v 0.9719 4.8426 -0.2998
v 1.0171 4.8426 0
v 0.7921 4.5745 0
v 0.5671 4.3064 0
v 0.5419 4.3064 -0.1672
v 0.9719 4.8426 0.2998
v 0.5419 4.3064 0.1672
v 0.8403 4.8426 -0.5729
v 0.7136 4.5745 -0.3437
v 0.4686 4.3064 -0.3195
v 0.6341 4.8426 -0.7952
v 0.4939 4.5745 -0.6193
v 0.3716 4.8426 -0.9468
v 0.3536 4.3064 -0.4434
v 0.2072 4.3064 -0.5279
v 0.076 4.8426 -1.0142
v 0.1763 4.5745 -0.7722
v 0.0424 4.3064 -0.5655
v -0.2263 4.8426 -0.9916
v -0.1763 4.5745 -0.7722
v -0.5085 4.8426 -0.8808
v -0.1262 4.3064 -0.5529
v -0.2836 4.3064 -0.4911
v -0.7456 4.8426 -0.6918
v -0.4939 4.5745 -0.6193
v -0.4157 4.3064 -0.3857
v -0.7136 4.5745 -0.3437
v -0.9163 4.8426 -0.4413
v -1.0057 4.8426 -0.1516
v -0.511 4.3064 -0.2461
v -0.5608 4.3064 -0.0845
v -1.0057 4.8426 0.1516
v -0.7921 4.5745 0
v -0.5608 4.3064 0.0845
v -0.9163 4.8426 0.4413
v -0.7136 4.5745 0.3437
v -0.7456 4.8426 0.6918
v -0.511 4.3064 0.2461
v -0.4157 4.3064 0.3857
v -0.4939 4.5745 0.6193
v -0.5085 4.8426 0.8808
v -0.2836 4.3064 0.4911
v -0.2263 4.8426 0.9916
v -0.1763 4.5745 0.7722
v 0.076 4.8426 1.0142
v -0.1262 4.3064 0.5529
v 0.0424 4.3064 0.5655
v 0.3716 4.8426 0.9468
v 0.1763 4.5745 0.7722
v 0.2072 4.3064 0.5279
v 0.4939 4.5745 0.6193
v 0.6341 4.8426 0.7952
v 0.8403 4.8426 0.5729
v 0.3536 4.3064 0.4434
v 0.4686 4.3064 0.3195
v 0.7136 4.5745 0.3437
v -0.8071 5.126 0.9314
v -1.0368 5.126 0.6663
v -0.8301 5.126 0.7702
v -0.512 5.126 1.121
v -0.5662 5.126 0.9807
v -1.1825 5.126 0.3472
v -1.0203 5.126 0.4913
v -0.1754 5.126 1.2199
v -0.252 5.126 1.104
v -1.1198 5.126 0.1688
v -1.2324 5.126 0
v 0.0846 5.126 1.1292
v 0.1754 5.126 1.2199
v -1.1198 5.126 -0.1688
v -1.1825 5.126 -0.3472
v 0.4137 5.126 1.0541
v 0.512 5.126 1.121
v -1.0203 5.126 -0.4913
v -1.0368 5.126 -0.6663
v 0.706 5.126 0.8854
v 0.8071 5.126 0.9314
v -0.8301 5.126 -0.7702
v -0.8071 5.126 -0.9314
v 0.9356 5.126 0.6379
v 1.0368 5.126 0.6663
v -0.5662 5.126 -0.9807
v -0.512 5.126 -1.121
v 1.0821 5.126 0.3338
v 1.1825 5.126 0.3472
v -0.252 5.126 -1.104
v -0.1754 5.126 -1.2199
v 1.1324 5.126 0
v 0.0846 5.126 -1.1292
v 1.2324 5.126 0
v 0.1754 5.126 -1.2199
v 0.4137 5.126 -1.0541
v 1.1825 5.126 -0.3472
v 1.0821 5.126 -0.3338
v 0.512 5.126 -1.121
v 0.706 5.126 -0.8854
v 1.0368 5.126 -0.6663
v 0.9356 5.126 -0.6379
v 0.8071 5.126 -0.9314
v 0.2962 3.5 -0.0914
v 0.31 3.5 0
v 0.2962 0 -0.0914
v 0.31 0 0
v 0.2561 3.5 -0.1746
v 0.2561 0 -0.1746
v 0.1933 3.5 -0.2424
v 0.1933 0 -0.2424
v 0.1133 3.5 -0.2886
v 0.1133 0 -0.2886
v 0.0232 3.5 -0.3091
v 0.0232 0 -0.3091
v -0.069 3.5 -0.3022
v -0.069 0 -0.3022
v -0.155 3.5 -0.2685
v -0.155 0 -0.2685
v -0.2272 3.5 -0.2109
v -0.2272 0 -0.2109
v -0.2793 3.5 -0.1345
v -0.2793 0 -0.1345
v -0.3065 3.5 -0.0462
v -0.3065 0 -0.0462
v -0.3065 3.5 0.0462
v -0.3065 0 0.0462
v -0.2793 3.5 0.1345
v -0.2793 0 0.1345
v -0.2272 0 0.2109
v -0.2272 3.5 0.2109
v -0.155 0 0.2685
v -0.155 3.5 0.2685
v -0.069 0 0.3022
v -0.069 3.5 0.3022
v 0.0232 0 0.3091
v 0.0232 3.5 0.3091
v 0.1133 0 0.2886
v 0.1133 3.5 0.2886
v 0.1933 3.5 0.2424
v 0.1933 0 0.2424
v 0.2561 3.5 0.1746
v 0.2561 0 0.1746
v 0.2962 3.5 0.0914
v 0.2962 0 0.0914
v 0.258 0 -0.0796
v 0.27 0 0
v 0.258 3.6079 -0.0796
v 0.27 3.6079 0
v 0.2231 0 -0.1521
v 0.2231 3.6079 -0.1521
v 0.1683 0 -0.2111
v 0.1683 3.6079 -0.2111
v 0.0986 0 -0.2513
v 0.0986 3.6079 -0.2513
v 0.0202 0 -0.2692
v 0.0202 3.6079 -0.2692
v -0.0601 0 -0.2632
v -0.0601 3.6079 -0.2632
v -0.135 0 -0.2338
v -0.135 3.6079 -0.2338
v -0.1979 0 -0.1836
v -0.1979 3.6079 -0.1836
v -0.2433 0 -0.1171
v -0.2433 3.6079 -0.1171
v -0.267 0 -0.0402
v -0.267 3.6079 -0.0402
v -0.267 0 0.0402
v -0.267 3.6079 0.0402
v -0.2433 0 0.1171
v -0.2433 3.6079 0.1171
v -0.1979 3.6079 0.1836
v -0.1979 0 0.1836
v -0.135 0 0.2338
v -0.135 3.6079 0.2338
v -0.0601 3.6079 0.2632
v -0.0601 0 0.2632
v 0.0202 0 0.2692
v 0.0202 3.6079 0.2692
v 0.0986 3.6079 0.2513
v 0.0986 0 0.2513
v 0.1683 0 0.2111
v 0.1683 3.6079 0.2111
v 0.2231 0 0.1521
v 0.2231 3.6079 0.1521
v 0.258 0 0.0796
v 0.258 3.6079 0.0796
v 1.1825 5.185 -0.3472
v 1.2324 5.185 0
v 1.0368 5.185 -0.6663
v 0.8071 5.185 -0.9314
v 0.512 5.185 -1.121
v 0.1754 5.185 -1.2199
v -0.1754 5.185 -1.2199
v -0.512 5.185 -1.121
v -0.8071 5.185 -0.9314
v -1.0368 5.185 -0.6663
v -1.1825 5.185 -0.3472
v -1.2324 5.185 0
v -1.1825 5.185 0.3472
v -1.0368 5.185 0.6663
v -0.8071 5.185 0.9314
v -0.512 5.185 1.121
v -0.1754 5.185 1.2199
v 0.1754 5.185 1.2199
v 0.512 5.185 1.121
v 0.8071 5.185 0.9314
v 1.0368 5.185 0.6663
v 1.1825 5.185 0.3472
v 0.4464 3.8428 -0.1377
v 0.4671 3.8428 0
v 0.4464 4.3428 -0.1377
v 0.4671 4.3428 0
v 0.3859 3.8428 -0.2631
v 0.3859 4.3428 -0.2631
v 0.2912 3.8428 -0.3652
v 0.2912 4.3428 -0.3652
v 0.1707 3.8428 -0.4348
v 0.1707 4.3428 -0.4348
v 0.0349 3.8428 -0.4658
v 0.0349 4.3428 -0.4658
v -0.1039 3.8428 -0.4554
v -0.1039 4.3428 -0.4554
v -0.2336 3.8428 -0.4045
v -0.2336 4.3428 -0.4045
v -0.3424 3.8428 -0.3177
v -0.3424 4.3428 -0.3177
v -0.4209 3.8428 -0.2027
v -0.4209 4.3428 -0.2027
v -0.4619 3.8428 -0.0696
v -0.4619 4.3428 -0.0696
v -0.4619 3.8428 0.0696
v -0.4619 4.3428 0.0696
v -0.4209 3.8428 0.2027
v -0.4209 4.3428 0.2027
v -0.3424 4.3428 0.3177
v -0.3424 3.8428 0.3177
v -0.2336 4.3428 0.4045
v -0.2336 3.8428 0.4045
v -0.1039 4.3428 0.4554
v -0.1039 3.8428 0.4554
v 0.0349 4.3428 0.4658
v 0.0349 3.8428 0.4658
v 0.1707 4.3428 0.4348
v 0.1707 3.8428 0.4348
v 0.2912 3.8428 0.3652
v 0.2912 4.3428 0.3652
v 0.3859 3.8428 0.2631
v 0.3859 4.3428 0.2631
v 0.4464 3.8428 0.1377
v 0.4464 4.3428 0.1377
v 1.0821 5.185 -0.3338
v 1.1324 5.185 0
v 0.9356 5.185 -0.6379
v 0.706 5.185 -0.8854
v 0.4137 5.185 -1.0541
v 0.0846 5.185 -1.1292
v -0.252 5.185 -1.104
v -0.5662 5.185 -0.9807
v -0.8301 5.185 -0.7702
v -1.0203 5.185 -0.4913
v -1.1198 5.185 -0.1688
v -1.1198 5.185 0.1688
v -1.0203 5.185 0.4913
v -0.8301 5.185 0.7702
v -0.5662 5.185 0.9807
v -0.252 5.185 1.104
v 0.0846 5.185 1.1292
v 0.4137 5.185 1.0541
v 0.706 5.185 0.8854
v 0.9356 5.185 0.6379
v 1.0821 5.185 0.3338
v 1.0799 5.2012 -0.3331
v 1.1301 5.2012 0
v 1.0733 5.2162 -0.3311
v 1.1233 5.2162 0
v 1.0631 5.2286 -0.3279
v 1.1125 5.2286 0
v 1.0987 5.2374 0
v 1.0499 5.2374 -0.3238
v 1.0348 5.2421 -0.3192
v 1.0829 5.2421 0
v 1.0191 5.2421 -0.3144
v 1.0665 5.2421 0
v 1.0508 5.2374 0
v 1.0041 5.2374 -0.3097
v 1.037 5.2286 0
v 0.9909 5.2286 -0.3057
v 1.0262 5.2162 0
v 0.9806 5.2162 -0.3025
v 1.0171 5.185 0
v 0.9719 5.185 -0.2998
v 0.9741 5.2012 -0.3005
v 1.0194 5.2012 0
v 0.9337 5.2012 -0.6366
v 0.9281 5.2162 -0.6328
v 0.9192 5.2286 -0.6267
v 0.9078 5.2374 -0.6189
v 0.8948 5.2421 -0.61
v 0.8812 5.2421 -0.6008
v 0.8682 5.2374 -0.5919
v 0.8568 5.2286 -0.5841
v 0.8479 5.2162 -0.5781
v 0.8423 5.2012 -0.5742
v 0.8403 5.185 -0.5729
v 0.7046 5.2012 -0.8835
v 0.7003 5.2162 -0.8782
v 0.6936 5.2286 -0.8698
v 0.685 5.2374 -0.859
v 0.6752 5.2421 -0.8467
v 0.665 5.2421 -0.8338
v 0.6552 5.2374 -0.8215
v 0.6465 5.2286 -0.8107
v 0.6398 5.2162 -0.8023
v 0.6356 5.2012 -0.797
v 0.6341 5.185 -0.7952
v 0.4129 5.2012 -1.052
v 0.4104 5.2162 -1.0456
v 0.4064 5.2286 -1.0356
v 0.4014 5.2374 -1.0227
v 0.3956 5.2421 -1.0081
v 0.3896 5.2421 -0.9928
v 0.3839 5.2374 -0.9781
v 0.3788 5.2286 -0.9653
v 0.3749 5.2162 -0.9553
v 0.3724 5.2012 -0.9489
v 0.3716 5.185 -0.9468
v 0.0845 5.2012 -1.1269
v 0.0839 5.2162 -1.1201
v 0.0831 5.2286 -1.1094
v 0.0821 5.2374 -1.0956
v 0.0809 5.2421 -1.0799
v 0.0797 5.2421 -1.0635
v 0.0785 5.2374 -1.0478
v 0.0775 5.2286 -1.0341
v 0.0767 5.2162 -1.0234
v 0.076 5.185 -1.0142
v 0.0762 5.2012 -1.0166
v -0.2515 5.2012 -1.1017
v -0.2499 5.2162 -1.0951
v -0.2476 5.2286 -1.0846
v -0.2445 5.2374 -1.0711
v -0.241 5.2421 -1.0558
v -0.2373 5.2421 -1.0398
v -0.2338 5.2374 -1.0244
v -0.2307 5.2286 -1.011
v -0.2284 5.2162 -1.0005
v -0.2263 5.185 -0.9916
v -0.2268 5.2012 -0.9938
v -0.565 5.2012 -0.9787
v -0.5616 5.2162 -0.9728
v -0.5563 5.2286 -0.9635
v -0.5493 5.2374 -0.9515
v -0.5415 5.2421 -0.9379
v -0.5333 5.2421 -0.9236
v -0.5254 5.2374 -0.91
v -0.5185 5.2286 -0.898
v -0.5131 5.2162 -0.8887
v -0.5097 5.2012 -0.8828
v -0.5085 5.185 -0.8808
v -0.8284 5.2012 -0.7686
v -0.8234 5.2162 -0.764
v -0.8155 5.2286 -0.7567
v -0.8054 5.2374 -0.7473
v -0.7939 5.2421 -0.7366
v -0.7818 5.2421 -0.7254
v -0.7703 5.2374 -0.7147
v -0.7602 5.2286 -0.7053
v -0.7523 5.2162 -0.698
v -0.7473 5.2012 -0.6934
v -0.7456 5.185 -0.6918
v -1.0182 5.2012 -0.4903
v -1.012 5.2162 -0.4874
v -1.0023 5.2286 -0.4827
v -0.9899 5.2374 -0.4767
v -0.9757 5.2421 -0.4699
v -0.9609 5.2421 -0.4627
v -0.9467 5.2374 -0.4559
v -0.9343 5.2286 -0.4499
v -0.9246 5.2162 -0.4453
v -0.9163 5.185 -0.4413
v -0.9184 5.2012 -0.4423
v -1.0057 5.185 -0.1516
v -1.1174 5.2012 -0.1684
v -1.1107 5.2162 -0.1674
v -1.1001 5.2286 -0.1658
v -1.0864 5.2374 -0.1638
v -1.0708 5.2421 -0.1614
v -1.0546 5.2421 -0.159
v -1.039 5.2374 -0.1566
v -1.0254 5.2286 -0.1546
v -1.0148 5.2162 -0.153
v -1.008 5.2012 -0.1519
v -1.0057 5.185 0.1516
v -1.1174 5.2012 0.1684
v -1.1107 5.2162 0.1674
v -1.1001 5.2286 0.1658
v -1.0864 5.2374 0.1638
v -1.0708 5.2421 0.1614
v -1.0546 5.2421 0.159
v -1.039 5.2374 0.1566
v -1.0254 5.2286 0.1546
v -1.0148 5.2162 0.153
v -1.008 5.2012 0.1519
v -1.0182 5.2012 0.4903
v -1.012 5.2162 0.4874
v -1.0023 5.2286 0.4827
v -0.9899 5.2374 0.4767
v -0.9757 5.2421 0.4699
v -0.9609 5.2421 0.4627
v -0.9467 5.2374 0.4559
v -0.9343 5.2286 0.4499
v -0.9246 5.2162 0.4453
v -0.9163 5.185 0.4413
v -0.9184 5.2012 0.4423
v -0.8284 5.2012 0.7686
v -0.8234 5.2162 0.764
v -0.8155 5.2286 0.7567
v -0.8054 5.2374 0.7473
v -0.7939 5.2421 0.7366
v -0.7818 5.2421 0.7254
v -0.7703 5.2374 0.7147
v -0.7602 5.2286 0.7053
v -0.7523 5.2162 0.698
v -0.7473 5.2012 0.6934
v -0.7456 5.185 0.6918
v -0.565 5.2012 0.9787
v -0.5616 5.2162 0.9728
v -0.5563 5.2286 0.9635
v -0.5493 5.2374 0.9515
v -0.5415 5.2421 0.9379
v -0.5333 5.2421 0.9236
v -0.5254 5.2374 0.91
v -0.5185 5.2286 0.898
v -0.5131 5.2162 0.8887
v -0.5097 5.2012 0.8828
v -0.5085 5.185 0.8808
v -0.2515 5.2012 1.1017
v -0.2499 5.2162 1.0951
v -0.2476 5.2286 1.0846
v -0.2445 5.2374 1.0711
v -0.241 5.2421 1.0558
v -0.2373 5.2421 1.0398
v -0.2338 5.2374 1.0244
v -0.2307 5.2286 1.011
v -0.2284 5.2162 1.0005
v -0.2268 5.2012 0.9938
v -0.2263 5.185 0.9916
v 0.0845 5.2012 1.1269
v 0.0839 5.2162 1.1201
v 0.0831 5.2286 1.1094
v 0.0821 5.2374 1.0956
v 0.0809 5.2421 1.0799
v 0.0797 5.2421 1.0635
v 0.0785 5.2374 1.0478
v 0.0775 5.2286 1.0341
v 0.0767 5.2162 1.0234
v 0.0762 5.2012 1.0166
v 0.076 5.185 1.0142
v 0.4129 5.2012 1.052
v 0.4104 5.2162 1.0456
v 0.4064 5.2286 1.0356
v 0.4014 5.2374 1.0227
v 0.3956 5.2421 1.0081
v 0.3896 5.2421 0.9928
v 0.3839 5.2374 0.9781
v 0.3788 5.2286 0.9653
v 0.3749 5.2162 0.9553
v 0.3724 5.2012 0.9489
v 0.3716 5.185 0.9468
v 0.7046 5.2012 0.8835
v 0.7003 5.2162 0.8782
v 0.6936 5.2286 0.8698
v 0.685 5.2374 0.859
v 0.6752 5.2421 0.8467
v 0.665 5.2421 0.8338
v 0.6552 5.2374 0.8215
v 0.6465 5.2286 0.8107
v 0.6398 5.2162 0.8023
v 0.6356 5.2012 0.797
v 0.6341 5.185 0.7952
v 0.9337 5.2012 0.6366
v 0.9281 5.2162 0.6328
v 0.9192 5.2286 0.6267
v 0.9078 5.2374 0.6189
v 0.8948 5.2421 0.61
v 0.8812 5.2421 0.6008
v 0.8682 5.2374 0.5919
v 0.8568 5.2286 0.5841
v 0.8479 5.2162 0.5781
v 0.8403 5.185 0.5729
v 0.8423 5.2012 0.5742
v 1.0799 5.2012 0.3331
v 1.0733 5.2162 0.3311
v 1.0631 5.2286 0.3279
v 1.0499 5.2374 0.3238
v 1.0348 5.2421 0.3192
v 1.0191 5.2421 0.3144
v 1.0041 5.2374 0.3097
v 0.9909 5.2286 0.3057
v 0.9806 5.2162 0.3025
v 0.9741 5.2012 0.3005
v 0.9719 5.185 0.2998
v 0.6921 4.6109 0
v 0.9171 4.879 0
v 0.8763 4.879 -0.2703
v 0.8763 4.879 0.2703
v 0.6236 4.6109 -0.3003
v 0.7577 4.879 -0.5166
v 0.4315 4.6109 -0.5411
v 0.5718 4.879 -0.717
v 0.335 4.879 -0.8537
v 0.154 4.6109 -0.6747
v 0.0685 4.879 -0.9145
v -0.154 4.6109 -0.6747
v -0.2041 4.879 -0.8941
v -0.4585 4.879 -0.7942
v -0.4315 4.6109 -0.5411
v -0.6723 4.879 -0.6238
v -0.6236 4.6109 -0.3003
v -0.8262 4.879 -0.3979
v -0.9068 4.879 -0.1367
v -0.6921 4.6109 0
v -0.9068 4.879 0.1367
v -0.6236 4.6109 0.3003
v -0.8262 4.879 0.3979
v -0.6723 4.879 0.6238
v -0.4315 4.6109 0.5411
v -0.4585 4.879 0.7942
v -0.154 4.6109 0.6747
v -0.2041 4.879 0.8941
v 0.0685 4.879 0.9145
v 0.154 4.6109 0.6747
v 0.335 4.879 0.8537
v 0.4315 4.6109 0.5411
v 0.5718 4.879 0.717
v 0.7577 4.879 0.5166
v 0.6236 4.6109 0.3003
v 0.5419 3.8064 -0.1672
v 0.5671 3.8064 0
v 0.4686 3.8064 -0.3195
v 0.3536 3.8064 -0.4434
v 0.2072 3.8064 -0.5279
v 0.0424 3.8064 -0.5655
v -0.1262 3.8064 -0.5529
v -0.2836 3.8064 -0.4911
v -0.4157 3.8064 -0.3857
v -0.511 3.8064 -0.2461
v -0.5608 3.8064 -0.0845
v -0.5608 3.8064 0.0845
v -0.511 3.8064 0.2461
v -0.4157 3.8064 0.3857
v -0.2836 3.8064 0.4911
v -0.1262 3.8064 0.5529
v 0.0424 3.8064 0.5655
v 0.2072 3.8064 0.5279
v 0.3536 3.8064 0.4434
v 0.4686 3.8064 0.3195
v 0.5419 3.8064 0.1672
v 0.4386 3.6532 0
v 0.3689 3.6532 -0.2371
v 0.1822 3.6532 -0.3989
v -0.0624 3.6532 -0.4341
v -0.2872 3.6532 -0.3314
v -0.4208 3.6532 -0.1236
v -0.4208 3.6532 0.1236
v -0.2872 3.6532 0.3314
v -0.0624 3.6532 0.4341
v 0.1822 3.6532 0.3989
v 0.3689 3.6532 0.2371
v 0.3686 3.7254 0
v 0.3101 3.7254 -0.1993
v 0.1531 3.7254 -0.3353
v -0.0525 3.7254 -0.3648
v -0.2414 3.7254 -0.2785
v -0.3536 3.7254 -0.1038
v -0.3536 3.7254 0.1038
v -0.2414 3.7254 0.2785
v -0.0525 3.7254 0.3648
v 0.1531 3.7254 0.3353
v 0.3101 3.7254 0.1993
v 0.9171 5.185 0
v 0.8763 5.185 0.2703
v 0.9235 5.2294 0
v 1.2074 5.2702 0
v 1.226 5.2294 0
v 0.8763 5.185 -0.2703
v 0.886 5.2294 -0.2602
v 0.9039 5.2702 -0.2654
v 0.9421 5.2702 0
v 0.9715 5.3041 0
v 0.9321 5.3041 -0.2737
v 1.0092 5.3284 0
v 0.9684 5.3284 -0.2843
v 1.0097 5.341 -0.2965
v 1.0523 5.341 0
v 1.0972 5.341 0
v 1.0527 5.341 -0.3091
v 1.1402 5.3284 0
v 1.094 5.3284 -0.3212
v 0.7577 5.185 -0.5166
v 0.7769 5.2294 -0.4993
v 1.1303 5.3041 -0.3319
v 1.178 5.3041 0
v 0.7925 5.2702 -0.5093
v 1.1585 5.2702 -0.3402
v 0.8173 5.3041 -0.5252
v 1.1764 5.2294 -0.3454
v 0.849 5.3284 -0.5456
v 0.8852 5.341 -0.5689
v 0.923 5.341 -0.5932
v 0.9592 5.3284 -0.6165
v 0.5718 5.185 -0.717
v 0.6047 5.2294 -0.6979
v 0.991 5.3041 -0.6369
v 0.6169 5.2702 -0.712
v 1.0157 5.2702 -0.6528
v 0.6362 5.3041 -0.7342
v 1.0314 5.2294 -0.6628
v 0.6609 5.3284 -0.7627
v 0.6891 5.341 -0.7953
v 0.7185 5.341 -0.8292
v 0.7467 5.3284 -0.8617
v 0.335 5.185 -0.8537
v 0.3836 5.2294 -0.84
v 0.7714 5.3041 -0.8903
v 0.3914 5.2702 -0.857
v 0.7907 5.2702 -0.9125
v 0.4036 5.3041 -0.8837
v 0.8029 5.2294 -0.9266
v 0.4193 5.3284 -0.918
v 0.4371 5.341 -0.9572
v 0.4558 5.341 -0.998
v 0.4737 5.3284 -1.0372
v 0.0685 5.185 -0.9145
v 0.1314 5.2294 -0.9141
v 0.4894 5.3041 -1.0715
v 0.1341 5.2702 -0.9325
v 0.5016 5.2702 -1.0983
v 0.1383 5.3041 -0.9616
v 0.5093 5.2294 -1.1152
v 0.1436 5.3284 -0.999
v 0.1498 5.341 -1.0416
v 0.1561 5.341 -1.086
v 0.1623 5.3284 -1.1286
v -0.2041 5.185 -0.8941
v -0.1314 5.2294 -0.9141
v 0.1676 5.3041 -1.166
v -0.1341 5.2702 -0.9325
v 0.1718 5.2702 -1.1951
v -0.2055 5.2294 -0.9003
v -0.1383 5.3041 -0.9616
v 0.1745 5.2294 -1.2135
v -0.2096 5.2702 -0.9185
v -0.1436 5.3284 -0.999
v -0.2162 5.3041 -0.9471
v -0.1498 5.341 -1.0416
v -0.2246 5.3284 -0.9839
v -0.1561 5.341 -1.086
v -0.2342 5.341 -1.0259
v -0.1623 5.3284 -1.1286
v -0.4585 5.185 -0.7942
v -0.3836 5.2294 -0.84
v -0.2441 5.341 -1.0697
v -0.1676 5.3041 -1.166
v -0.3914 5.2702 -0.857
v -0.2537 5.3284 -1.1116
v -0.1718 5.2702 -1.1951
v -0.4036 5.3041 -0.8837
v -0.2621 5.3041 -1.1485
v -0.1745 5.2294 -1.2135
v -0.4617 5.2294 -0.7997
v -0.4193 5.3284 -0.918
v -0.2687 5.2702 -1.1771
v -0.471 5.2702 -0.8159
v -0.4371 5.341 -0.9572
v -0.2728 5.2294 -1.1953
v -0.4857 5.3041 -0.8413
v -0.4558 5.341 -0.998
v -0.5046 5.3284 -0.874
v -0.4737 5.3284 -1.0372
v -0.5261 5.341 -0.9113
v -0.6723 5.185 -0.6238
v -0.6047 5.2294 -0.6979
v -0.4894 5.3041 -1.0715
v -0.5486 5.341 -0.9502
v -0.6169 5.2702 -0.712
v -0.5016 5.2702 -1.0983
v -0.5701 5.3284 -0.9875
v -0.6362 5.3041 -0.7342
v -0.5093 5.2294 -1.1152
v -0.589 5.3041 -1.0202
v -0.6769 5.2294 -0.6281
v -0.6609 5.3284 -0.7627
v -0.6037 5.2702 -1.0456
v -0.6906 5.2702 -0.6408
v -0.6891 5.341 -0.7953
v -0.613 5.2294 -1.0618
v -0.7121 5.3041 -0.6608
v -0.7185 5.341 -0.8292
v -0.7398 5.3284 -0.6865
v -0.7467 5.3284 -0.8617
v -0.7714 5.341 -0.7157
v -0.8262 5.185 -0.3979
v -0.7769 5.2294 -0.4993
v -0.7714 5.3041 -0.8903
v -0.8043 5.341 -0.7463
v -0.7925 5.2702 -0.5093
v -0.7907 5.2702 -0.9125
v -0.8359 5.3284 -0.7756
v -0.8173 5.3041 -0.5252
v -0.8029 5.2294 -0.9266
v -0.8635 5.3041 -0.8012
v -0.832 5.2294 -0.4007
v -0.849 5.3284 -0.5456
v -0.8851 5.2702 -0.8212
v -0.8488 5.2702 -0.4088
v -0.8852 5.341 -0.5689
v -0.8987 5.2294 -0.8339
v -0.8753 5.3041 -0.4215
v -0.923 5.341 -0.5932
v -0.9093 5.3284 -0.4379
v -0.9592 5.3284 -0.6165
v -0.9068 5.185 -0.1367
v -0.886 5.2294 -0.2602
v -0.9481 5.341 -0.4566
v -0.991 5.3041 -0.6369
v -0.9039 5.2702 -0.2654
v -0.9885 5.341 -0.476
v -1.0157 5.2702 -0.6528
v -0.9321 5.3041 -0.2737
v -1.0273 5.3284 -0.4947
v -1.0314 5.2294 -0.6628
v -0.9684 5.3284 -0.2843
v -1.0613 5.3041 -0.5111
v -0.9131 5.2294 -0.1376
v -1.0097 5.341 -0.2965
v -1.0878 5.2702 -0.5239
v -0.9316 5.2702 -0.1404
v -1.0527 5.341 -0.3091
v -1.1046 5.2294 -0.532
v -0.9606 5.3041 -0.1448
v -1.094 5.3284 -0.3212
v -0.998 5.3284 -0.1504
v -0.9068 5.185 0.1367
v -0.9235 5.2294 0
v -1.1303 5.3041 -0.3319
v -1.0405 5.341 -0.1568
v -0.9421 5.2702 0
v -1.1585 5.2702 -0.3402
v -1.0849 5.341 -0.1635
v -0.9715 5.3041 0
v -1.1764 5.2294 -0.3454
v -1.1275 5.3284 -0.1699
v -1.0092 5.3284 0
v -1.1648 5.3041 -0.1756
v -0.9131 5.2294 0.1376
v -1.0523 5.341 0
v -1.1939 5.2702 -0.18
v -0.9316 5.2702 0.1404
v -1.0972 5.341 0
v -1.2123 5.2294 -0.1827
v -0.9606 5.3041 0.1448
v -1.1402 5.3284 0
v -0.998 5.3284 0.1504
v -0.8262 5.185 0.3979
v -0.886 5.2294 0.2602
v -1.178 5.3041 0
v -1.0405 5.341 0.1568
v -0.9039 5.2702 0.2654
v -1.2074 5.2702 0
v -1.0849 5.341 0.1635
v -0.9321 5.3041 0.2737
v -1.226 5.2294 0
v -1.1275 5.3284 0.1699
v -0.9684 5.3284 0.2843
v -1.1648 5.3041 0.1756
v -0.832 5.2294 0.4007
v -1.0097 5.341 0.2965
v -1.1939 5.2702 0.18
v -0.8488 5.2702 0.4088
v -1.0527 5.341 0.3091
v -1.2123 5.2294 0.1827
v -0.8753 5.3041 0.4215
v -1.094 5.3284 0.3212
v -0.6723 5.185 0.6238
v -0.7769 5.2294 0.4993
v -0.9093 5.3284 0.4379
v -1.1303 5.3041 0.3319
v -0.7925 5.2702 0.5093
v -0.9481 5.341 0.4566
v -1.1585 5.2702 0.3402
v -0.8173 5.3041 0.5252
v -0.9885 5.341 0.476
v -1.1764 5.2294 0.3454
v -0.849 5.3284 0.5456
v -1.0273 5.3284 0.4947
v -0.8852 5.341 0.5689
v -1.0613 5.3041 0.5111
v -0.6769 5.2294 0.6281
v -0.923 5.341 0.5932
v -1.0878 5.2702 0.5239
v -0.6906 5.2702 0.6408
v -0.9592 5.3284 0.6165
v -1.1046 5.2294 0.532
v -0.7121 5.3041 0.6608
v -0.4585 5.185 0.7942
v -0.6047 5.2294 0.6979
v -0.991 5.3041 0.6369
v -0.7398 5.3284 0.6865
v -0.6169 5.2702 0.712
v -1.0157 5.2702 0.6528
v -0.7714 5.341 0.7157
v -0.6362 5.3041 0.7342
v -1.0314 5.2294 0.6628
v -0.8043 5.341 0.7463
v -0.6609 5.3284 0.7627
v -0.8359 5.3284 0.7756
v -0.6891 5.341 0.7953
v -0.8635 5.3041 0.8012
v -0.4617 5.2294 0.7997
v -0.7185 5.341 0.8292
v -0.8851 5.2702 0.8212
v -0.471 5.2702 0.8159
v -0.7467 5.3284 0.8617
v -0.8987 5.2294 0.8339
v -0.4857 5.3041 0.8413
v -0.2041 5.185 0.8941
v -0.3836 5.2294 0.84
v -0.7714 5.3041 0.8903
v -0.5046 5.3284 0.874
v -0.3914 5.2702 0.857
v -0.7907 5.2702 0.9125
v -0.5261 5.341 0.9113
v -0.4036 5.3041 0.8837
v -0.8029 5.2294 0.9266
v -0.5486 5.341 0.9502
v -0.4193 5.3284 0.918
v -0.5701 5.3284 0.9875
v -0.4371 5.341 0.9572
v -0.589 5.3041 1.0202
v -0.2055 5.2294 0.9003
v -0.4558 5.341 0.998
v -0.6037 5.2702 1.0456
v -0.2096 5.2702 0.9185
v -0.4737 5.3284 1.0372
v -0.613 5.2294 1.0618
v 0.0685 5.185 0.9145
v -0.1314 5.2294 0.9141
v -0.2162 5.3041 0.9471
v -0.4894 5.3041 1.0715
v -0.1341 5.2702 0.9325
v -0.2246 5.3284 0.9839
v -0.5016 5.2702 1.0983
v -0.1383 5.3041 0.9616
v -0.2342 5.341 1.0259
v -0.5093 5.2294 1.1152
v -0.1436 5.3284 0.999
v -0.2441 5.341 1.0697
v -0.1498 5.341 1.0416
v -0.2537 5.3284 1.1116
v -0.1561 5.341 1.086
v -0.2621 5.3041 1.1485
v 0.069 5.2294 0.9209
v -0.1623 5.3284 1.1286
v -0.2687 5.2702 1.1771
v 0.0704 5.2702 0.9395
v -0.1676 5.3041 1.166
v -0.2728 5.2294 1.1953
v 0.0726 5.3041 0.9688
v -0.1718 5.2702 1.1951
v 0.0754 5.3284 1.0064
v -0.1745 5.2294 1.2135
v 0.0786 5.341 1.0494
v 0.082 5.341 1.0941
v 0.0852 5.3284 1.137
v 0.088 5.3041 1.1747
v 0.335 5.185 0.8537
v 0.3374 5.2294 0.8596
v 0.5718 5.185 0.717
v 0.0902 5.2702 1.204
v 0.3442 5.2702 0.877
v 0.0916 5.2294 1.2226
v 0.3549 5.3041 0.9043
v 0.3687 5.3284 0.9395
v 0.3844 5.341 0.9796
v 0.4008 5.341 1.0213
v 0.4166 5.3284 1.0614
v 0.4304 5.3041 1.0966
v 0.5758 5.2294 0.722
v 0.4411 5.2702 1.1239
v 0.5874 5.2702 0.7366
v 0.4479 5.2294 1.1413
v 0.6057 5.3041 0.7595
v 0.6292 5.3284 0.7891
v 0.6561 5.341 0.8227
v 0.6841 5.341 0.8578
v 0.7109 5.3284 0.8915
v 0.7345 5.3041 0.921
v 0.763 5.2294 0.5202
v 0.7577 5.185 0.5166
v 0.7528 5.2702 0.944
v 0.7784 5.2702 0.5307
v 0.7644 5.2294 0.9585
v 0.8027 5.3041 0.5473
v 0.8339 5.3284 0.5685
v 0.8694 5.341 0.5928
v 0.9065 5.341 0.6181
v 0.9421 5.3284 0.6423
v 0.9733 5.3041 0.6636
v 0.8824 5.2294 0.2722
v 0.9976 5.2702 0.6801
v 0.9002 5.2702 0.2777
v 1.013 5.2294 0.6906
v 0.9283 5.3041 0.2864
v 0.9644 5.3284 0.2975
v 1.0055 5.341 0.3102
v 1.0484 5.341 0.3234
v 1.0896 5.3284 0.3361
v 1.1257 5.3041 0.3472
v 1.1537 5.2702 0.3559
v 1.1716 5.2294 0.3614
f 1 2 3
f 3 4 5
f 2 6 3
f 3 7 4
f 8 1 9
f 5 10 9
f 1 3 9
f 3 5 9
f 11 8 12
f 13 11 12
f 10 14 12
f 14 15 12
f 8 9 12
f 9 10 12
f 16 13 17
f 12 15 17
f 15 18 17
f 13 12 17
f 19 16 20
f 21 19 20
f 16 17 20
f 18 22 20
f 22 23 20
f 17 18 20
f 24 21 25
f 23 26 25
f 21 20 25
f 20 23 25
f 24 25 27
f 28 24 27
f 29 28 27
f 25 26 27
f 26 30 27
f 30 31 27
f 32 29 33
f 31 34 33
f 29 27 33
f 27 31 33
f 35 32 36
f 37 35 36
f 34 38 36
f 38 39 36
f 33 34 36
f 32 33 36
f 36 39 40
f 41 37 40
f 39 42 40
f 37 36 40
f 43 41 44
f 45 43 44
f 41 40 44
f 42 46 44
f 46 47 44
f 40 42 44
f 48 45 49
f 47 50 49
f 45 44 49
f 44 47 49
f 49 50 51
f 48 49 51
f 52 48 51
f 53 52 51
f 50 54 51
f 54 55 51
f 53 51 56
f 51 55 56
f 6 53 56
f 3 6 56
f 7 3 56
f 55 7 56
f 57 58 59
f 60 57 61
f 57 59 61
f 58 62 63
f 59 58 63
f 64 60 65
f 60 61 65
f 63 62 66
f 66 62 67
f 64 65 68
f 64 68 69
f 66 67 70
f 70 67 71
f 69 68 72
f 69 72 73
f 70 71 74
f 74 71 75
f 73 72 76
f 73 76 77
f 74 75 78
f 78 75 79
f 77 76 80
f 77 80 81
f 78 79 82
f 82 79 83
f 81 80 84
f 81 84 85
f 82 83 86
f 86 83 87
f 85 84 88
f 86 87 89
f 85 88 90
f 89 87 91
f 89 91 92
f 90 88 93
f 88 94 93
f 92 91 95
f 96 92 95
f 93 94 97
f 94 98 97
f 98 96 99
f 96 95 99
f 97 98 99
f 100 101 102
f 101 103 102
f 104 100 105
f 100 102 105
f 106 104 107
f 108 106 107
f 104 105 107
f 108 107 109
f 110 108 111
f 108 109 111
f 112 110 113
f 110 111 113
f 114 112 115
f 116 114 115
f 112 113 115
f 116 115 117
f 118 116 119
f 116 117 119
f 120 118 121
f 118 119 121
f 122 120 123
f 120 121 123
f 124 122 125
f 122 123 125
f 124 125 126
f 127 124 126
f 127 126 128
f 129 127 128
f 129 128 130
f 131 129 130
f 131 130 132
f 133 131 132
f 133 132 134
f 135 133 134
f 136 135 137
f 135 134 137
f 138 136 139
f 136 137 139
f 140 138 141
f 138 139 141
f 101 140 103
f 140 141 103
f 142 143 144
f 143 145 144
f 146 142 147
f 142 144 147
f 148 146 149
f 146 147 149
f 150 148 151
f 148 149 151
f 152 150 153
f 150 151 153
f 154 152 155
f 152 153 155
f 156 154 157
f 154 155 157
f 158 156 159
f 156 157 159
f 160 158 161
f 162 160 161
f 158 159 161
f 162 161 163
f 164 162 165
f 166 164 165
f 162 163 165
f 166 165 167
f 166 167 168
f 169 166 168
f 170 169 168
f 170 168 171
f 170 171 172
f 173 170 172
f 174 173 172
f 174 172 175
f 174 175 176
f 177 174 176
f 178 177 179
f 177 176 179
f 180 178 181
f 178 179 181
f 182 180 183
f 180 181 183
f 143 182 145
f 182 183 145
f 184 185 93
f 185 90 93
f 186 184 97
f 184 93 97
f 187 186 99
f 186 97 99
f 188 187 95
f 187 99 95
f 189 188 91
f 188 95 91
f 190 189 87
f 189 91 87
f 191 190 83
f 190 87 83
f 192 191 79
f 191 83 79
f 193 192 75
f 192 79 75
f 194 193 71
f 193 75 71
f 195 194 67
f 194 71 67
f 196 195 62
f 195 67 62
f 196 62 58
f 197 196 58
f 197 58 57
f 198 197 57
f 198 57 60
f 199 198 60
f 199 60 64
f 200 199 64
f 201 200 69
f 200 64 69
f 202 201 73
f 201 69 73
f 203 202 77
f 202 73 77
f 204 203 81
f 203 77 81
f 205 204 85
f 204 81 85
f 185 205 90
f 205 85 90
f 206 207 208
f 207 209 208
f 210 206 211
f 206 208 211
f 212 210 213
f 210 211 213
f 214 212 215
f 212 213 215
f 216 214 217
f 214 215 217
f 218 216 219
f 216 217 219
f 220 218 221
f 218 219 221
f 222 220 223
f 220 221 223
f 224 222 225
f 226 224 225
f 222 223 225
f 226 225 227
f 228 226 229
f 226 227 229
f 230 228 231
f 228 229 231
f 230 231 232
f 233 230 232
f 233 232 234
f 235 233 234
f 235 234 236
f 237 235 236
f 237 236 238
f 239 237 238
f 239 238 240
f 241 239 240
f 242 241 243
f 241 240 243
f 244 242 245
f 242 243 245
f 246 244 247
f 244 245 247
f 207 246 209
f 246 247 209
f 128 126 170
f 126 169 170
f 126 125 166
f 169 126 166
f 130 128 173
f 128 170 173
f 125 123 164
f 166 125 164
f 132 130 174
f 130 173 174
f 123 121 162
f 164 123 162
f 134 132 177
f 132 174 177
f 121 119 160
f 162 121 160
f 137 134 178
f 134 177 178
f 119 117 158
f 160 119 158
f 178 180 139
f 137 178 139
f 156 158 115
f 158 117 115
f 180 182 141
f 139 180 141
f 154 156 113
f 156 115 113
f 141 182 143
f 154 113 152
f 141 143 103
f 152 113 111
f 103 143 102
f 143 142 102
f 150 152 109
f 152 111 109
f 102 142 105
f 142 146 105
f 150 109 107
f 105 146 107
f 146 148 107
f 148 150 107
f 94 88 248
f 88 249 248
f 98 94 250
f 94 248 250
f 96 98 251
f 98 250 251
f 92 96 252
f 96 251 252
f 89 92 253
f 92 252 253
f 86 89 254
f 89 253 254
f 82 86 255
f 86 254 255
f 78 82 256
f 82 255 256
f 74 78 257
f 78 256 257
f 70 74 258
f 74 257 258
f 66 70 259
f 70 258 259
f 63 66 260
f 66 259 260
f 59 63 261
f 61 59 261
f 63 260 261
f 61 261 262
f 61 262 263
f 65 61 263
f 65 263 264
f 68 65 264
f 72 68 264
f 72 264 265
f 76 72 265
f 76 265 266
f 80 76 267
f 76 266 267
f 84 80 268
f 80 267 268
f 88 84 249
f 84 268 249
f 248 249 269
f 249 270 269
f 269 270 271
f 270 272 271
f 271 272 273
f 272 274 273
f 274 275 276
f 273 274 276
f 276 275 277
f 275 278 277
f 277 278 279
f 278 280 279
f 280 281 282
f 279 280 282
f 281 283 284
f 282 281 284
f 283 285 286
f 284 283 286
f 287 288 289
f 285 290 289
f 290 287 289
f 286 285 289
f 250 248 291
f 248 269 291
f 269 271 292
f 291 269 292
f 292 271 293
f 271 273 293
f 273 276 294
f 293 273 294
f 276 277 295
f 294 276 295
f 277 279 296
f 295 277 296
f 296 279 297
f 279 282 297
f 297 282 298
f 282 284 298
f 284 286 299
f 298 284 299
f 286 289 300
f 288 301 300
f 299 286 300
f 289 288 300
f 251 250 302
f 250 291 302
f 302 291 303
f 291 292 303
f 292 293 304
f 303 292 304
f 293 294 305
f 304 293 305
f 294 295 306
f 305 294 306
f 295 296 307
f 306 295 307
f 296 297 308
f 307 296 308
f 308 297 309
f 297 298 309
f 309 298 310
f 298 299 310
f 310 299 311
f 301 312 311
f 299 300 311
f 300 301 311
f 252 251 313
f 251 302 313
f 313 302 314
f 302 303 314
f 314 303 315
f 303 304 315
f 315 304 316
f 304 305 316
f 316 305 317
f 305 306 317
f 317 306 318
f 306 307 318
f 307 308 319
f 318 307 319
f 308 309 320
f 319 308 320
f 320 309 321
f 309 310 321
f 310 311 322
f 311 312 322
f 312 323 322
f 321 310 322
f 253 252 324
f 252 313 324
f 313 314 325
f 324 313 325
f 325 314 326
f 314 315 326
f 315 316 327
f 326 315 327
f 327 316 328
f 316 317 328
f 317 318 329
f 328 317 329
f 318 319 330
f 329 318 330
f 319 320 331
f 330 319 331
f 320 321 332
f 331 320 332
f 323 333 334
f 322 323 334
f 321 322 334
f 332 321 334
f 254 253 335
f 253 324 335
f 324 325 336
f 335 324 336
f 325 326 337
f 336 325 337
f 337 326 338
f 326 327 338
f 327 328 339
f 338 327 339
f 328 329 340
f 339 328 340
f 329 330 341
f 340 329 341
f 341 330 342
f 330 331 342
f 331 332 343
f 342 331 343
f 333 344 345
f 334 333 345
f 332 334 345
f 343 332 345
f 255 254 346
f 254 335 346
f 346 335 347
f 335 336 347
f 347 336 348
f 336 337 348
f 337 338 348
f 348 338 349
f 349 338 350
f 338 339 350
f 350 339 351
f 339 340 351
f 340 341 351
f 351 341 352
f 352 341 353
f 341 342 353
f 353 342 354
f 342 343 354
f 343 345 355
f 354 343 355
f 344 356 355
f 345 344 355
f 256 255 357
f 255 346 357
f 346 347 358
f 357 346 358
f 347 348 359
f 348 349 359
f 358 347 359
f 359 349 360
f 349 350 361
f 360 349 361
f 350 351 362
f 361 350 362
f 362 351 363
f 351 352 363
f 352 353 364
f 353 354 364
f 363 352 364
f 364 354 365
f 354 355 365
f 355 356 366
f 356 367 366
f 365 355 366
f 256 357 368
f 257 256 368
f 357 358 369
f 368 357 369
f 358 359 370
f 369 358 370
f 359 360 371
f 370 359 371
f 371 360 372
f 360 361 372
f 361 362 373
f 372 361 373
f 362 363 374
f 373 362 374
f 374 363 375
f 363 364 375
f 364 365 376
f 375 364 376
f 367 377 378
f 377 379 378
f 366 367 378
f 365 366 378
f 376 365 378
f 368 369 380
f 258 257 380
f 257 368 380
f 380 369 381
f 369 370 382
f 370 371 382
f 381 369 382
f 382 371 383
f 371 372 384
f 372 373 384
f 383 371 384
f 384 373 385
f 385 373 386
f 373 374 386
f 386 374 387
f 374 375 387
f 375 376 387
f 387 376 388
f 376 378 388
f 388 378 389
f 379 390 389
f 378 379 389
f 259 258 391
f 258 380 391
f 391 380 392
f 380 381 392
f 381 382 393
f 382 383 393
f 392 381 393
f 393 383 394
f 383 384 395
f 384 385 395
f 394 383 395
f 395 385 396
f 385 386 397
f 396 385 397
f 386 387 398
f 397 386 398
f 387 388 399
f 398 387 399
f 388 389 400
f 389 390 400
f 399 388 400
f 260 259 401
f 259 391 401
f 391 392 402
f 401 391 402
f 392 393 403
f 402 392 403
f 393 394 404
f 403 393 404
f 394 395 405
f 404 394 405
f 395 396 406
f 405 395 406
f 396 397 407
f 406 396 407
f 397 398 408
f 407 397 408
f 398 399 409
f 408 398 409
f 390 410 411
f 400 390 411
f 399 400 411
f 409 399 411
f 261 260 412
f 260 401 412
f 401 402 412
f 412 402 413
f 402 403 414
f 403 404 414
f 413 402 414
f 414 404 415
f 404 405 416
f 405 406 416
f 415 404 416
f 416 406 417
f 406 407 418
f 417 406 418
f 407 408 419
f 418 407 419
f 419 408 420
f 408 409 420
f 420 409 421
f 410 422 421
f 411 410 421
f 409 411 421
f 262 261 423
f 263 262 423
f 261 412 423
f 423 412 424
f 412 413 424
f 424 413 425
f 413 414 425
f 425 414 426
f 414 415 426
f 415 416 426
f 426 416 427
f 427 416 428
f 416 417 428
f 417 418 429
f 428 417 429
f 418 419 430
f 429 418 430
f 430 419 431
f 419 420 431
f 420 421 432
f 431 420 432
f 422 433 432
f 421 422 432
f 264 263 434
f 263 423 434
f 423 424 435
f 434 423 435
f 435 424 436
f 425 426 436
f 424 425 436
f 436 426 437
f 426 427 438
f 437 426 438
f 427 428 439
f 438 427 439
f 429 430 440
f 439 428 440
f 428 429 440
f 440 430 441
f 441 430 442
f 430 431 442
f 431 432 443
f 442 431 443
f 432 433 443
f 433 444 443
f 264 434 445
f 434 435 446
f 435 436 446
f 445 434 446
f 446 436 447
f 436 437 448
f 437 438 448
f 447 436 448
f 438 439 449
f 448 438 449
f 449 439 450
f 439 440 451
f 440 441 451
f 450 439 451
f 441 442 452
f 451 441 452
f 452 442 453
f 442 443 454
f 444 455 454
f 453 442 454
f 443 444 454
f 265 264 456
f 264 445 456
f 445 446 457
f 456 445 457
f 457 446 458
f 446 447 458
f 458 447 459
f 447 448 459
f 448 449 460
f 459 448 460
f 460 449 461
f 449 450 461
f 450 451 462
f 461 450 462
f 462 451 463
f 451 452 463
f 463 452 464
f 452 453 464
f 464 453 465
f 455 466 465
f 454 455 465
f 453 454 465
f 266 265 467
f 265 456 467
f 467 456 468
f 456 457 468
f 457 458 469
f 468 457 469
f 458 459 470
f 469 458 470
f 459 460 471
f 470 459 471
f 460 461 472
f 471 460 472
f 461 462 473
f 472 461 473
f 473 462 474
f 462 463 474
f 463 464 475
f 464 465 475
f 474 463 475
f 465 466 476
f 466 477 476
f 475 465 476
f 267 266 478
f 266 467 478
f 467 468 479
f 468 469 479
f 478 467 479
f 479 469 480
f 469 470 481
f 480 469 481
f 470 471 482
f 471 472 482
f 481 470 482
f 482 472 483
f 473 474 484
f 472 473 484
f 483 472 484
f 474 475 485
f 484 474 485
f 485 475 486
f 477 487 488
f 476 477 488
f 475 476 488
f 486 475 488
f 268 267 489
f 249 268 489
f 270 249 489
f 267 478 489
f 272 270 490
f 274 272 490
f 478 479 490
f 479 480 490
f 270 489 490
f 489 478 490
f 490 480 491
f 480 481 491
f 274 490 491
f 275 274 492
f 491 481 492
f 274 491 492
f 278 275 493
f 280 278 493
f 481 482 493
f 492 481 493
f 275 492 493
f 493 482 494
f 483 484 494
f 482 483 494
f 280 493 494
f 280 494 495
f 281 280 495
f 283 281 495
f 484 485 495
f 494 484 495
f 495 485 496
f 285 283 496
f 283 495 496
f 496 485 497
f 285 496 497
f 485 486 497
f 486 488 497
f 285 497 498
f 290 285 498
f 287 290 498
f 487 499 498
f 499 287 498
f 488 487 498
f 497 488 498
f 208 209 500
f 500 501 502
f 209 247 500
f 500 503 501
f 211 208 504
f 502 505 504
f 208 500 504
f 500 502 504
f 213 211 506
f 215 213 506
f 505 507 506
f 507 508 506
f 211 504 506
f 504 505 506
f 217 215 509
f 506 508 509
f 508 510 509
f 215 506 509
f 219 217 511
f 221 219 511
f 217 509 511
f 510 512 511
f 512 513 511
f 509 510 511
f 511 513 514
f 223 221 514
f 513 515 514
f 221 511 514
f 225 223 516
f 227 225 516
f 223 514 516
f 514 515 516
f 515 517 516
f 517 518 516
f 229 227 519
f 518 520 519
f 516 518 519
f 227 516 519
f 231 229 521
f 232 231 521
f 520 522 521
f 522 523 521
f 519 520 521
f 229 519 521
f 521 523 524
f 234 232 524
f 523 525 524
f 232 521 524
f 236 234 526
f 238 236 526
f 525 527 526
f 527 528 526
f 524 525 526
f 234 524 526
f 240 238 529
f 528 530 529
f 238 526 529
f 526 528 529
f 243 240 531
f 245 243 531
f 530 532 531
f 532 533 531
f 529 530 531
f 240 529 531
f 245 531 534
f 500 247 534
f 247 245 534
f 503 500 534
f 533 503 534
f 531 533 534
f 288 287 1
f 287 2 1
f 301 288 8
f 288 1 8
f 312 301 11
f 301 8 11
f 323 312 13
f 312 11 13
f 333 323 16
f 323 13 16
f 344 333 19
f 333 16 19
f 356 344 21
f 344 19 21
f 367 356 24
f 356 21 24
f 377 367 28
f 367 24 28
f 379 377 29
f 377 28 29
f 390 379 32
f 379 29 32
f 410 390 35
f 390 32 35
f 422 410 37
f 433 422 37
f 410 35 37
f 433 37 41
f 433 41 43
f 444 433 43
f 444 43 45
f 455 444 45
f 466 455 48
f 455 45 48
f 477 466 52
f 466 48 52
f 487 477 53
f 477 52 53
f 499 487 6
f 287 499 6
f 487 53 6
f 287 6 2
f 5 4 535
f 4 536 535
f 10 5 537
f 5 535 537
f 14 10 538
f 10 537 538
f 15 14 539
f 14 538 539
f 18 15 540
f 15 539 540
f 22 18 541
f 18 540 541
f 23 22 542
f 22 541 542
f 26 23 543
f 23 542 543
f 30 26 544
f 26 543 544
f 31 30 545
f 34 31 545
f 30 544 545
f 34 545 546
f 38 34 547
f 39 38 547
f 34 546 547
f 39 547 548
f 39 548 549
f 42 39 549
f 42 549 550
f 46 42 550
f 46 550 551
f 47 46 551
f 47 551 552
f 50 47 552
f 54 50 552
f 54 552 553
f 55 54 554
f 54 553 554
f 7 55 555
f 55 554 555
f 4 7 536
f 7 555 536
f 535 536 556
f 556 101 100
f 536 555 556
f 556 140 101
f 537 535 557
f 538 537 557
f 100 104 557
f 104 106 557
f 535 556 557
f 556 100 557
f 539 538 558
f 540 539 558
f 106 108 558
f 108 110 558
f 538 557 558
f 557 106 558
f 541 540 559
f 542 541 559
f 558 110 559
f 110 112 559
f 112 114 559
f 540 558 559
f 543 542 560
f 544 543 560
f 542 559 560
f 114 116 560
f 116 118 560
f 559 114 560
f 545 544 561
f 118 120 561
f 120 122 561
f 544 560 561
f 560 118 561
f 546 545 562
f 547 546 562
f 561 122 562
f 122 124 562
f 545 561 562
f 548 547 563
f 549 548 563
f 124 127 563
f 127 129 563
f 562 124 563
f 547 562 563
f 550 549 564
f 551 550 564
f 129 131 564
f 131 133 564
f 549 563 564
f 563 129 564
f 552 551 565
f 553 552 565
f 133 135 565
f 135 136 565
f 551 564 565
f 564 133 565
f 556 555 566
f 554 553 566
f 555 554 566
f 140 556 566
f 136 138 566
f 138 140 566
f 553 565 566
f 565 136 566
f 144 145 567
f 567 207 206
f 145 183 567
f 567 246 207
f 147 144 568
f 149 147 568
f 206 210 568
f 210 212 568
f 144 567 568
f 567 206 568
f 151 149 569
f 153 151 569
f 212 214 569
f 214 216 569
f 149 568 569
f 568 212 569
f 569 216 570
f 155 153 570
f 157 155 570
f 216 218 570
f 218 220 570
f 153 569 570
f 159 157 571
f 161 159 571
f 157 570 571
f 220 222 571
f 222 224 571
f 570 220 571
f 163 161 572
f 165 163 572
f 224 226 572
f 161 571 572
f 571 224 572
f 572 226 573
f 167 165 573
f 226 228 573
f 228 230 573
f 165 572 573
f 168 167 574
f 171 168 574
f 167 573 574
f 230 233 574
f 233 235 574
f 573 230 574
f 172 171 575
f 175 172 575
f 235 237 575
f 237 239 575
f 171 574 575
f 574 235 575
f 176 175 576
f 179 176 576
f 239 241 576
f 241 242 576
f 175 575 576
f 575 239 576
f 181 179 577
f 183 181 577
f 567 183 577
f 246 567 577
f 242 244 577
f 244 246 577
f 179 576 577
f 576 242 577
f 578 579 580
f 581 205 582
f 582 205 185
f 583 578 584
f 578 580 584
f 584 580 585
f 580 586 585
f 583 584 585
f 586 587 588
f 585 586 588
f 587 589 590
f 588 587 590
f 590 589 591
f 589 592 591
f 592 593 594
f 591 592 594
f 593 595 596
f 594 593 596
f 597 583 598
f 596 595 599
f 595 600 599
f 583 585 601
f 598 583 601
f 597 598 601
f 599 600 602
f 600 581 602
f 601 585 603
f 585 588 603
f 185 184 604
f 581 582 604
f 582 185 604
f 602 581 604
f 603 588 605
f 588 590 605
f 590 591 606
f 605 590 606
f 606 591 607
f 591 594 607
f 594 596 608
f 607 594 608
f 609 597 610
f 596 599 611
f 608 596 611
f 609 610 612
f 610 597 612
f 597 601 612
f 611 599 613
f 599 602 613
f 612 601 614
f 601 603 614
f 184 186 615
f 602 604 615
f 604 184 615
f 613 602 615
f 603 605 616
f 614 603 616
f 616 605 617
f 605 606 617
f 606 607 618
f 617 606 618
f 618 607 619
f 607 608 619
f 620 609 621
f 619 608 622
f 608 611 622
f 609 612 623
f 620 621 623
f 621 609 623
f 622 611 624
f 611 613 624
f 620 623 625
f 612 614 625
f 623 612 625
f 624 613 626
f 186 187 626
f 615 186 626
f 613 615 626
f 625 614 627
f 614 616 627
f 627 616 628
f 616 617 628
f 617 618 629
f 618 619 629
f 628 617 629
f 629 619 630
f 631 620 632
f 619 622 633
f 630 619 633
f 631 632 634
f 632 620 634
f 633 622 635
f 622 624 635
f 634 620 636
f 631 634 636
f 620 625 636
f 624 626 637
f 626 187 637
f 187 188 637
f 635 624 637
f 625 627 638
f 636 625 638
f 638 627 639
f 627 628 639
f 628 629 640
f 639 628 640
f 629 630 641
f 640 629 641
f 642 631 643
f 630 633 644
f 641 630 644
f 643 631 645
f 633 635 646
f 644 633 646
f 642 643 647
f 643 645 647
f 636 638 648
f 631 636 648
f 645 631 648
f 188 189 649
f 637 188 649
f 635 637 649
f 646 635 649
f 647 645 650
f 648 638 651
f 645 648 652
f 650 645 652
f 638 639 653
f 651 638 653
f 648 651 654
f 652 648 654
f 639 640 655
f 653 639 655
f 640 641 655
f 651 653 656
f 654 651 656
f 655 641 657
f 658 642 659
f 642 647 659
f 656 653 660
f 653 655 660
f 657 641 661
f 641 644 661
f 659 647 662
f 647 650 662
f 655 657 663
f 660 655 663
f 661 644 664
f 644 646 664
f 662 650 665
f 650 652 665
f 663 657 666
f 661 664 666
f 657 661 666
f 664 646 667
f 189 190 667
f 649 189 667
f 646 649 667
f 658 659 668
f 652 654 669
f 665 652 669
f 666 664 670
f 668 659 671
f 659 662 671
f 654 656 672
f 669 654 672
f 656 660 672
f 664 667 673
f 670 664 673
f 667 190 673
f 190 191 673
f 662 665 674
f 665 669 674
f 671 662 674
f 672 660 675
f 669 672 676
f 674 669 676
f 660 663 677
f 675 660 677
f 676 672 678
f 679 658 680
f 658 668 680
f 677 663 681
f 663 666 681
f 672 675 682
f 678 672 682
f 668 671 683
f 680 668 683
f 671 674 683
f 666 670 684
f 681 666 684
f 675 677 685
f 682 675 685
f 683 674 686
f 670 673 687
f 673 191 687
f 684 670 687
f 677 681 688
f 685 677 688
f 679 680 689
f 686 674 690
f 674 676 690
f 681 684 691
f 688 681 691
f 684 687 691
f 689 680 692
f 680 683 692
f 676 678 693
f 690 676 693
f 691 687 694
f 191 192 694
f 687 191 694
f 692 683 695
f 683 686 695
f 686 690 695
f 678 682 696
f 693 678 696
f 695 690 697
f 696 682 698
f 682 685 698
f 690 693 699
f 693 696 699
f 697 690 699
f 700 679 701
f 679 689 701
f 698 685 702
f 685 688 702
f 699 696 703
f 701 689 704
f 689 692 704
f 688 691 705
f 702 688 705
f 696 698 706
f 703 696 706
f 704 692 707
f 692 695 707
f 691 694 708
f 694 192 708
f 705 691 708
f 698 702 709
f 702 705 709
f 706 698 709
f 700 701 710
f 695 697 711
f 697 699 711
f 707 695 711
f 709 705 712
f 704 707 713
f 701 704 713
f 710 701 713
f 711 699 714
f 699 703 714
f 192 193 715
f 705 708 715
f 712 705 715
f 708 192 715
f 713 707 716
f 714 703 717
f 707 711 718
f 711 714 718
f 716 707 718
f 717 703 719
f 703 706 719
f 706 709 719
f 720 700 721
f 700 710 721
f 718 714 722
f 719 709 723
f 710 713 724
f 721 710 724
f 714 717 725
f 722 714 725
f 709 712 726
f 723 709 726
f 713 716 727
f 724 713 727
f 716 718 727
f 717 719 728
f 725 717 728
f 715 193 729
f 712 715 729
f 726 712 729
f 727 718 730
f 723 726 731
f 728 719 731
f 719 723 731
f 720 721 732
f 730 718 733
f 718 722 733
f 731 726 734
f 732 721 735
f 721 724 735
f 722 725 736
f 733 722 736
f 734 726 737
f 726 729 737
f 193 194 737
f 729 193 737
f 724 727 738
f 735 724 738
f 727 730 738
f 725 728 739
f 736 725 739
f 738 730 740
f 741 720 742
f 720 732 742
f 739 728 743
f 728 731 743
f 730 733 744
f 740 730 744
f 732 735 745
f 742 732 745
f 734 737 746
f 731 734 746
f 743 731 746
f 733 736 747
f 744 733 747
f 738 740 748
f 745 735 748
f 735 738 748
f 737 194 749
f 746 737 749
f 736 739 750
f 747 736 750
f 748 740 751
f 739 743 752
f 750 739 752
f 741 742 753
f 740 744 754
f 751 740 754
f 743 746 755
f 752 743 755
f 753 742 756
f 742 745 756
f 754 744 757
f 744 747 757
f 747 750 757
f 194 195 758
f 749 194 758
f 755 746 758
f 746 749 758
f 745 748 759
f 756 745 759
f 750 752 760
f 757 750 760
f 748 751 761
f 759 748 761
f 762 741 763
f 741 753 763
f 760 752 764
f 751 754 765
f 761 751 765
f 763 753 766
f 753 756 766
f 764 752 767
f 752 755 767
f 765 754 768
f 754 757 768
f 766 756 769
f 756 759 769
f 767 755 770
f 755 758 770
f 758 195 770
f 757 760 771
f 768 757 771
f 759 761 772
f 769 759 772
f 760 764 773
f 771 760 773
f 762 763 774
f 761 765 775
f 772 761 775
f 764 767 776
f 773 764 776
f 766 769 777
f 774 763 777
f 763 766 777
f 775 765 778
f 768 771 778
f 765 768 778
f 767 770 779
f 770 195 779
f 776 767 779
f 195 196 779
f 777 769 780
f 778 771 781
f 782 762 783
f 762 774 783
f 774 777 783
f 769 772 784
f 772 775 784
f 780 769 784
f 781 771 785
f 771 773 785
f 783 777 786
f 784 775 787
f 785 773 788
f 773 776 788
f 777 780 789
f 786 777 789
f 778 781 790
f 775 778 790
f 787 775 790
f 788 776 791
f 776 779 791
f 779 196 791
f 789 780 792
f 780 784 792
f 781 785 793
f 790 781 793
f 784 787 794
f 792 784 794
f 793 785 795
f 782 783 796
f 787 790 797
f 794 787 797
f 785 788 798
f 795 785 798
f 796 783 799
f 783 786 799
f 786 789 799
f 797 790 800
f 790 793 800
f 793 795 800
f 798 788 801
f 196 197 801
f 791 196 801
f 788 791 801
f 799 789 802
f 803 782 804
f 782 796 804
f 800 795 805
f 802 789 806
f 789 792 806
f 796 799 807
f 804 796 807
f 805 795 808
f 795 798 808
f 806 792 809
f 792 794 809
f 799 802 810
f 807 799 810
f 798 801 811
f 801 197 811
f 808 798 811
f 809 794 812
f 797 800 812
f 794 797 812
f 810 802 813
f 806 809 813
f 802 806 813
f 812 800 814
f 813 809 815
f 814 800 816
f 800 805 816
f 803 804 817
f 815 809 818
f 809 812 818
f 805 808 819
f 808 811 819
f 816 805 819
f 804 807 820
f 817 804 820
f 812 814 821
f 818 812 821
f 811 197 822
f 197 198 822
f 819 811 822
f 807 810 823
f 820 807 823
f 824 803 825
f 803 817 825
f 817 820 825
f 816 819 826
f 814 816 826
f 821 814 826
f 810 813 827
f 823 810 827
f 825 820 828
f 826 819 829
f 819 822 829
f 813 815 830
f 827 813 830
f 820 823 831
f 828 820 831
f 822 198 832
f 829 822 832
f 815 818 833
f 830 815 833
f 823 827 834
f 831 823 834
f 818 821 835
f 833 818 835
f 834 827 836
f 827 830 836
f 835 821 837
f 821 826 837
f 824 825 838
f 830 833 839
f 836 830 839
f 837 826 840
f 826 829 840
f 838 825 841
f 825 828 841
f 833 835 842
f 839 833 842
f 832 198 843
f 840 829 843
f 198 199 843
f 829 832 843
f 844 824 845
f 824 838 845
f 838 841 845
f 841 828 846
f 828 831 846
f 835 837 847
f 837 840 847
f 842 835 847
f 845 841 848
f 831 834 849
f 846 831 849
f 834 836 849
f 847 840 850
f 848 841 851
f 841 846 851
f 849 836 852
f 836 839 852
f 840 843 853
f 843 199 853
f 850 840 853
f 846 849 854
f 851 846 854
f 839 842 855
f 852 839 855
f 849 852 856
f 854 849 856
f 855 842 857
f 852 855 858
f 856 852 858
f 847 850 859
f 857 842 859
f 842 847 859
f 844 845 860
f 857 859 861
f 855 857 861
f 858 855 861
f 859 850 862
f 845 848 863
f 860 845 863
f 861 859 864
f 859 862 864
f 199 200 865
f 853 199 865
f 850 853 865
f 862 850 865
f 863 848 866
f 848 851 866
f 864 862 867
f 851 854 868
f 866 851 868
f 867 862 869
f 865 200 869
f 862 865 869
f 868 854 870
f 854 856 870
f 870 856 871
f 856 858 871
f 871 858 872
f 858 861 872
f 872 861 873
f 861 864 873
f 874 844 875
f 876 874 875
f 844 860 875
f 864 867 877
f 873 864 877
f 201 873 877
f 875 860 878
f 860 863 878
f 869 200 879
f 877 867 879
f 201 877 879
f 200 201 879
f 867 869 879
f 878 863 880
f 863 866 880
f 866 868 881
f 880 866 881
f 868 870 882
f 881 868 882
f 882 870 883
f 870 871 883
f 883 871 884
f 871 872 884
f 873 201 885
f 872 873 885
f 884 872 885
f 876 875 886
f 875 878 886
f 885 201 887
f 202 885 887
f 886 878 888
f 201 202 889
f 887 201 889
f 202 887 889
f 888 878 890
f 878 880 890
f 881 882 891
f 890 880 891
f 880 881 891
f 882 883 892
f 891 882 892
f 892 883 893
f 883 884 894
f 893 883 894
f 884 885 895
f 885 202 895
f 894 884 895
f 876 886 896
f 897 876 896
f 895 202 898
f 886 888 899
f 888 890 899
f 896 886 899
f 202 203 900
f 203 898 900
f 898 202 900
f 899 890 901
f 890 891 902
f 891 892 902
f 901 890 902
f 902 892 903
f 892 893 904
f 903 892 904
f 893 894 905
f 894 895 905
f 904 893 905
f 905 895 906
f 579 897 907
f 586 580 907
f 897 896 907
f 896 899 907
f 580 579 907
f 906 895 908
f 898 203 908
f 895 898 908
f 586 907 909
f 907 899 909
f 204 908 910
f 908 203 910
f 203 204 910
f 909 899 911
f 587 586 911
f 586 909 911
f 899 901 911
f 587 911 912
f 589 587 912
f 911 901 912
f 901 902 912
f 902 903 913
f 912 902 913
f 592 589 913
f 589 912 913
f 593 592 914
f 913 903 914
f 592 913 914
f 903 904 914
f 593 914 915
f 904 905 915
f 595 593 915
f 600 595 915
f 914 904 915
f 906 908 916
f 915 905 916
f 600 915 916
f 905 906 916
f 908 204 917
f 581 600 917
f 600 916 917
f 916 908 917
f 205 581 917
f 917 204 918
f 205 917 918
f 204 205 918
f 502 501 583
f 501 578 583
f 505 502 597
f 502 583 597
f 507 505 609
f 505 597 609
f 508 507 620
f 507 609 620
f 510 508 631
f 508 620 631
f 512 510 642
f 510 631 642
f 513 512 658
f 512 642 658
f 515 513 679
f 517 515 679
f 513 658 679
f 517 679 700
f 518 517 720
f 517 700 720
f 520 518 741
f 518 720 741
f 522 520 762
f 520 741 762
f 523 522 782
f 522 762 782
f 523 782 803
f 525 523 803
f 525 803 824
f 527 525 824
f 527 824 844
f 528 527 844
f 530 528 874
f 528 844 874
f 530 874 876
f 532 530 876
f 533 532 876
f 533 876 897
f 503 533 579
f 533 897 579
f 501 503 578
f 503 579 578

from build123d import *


with BuildPart() as part:
    # 草图1 → 旋转1 (revolve)
    with BuildSketch(Plane.XY):
        with BuildLine():
            ThreePointArc((0.917066371, 5.184978302), (1.074736956, 5.342648887), (1.232407542, 5.184978302))
            Line((1.232407542, 5.184978302), (1.232407542, 5.126017406))
            Line((1.232407542, 5.126017406), (1.132407542, 5.126017406))
            Line((1.132407542, 5.126017406), (1.132407542, 5.184978302))
            ThreePointArc((1.132407542, 5.184978302), (1.074736956, 5.242648887), (1.017066371, 5.184978302))
            Line((1.017066371, 5.184978302), (1.017066371, 4.842648887))
            Line((1.017066371, 4.842648887), (0.567115044, 4.306417777))
            Line((0.567115044, 4.306417777), (0.567115044, 3.806417777))
            Line((0.567115044, 3.806417777), (0.31, 3.5))
            Line((0.31, 3.5), (0.31, 0))
            Line((0.31, 0), (0.27, 0))
            Line((0.27, 0), (0.27, 3.607902239))
            Line((0.27, 3.607902239), (0.467115044, 3.842814801))
            Line((0.467115044, 3.842814801), (0.467115044, 4.342814801))
            Line((0.467115044, 4.342814801), (0.917066371, 4.879045911))
            Line((0.917066371, 4.879045911), (0.917066371, 5.184978302))
        make_face()
    revolve(axis=Axis((0, -31.348606249, 0), (0, 1, 0)))


solid = part.part
